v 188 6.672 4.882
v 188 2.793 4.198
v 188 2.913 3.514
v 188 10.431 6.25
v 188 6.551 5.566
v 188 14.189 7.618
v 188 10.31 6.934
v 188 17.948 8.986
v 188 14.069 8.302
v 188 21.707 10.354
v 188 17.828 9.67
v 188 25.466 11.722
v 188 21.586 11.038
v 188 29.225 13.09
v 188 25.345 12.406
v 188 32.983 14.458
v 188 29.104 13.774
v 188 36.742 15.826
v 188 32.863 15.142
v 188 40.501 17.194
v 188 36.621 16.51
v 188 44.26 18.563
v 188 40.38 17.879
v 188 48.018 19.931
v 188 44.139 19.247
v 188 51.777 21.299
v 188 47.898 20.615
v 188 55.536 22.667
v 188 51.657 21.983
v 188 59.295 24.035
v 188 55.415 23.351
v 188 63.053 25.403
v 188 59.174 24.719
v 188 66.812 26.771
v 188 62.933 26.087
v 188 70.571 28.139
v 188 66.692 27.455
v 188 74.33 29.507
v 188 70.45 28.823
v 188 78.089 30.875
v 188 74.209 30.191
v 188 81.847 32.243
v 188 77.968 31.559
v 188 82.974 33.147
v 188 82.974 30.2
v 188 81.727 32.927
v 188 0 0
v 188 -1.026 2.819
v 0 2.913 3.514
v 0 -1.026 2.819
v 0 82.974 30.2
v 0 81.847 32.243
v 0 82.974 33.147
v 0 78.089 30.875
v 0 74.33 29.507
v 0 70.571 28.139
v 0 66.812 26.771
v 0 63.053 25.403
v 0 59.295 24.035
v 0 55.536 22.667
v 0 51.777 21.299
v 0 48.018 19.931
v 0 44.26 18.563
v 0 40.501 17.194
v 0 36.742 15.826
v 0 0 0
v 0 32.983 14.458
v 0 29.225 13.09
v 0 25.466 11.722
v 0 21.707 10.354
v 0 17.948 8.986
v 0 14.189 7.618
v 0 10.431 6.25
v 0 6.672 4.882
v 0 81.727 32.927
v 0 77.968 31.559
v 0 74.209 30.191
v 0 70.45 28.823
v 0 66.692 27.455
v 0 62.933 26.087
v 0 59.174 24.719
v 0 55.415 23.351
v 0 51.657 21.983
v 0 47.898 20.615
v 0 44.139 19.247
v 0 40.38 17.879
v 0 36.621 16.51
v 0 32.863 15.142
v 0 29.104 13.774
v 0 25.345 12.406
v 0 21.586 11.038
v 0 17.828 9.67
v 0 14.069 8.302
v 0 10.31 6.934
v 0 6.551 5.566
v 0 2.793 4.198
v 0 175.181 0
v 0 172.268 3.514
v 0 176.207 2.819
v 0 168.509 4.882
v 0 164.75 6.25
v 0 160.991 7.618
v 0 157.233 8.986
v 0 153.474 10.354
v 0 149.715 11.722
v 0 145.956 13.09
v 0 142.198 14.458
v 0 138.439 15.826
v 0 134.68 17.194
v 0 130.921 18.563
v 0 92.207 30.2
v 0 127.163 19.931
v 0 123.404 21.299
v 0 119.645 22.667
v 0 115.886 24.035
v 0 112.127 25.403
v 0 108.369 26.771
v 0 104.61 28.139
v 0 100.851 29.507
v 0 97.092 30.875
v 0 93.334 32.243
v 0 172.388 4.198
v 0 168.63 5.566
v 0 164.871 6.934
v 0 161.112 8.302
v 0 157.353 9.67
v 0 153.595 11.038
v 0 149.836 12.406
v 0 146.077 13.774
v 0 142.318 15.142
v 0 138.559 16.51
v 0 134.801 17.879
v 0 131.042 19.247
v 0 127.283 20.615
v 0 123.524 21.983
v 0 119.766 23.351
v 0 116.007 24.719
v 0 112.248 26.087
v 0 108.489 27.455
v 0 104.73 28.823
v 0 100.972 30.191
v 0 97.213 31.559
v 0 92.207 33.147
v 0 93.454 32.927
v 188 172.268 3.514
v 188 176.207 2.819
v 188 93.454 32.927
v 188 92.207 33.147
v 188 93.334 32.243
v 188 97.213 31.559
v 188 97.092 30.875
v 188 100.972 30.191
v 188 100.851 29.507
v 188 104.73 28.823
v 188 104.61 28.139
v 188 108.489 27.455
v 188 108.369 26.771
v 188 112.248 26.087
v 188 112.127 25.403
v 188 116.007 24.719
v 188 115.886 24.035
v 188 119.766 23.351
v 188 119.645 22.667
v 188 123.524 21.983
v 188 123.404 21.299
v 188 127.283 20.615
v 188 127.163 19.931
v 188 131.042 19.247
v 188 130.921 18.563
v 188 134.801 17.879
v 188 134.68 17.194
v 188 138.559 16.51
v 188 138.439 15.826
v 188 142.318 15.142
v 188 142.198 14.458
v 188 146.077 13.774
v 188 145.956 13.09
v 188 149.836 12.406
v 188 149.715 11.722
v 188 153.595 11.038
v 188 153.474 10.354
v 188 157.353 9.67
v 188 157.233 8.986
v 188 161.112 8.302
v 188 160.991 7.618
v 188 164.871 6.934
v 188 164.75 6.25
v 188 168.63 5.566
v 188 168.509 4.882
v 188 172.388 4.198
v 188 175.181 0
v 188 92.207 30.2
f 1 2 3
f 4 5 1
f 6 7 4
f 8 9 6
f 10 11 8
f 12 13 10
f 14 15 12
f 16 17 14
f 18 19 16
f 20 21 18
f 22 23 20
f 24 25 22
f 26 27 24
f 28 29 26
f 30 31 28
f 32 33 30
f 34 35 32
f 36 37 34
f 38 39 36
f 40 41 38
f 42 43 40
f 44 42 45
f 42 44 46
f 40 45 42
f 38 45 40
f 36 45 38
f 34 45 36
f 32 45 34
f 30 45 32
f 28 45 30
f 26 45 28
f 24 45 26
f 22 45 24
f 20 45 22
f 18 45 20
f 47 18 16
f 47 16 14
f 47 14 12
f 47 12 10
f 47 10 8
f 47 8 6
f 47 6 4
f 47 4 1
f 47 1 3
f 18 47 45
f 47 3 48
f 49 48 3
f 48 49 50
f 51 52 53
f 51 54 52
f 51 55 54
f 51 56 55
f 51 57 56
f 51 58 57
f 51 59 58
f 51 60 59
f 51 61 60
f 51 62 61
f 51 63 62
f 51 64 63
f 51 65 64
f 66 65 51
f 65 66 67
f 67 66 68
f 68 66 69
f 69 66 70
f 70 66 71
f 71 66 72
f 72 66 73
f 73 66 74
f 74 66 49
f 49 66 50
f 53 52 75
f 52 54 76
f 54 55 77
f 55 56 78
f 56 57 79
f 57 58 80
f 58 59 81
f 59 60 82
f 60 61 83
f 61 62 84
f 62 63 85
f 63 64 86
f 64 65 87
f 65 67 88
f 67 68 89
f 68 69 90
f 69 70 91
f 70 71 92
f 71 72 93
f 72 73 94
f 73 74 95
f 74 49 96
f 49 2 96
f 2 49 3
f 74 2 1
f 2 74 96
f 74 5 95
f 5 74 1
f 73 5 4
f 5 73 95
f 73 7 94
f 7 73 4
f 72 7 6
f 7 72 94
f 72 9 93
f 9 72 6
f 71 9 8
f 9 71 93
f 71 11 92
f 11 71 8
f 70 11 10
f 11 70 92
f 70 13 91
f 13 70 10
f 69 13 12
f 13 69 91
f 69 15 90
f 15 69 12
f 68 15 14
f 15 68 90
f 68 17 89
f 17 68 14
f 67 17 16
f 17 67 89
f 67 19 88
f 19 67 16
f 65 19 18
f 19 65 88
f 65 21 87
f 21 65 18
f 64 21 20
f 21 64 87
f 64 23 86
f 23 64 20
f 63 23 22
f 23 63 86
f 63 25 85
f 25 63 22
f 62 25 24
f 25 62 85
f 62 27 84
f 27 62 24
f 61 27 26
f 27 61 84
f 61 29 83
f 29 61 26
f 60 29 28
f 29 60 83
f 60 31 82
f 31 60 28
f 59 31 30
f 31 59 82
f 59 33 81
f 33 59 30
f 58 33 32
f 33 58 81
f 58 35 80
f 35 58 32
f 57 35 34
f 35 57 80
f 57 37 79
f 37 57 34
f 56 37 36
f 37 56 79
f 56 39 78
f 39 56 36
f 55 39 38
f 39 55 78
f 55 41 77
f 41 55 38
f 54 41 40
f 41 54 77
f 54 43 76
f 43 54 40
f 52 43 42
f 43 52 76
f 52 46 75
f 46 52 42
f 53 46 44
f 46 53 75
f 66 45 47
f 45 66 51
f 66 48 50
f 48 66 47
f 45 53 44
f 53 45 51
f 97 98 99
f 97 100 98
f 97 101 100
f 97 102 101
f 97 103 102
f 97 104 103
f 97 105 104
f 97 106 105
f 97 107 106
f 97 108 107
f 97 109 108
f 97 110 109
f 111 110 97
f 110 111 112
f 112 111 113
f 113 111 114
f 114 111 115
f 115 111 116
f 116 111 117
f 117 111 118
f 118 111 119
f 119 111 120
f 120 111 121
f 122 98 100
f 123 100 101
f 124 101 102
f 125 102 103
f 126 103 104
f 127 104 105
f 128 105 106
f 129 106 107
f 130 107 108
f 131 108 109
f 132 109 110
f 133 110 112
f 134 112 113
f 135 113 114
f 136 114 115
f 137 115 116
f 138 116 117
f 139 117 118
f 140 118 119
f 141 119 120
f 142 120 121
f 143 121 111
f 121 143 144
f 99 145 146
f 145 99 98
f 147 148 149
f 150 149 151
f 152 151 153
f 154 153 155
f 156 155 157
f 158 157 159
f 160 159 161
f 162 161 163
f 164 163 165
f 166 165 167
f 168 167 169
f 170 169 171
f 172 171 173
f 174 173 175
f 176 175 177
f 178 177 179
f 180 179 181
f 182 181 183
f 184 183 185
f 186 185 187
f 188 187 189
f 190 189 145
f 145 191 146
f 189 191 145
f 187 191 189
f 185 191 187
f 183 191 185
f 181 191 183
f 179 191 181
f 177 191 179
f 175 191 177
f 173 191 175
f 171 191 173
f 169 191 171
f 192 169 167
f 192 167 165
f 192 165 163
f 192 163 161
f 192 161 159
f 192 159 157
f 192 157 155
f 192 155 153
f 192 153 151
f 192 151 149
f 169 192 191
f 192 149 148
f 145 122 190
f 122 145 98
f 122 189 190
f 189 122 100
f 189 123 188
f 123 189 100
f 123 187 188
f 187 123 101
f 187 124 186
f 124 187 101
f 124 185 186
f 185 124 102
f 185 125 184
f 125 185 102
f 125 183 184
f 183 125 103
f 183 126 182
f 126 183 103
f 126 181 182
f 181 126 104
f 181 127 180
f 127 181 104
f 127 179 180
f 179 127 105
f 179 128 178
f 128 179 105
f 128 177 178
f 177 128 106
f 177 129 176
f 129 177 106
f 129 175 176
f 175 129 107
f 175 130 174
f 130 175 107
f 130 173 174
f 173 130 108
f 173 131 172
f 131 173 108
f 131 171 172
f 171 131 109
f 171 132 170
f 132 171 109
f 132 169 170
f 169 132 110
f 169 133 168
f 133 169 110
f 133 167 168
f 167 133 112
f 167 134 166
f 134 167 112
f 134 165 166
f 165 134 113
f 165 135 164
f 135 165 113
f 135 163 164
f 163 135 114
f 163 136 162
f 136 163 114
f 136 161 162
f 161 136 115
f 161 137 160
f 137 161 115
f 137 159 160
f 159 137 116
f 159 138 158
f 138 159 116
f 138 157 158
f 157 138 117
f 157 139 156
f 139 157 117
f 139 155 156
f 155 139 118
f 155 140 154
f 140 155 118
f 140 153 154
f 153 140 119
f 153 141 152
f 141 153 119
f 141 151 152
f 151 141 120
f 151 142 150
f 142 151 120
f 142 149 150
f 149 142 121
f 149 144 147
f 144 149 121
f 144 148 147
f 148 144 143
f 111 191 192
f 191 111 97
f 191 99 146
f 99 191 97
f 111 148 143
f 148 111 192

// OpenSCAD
offset=10; // explosion offset
a=20; // roof angle
l=188; // length
w=168/cos(a); // width
t=3; // roof thickness

difference(){
    rotate([a,0,0]) difference() {
        cube([l,w/2,t]);
        for(x=[0:4:w/2]) translate([0,x,t]) rotate([-10,0,0]) cube([l,4,t]);
    }
    translate([0,cos(a)*w/2-sin(a)*t,sin(a)*w/2-t]) cube([l,t*2,t*2]);
}

translate([l,cos(a)*(w-t)+offset,0]) rotate([0,0,180]) difference(){
    rotate([a,0,0]) difference() {
        cube([l,w/2,t]);
        for(x=[0:4:w/2]) translate([0,x,t]) rotate([-10,0,0]) cube([l,4,t]);
    }
    translate([0,cos(a)*w/2-sin(a)*t,sin(a)*w/2-t]) cube([l,t*2,t*2]);
}
